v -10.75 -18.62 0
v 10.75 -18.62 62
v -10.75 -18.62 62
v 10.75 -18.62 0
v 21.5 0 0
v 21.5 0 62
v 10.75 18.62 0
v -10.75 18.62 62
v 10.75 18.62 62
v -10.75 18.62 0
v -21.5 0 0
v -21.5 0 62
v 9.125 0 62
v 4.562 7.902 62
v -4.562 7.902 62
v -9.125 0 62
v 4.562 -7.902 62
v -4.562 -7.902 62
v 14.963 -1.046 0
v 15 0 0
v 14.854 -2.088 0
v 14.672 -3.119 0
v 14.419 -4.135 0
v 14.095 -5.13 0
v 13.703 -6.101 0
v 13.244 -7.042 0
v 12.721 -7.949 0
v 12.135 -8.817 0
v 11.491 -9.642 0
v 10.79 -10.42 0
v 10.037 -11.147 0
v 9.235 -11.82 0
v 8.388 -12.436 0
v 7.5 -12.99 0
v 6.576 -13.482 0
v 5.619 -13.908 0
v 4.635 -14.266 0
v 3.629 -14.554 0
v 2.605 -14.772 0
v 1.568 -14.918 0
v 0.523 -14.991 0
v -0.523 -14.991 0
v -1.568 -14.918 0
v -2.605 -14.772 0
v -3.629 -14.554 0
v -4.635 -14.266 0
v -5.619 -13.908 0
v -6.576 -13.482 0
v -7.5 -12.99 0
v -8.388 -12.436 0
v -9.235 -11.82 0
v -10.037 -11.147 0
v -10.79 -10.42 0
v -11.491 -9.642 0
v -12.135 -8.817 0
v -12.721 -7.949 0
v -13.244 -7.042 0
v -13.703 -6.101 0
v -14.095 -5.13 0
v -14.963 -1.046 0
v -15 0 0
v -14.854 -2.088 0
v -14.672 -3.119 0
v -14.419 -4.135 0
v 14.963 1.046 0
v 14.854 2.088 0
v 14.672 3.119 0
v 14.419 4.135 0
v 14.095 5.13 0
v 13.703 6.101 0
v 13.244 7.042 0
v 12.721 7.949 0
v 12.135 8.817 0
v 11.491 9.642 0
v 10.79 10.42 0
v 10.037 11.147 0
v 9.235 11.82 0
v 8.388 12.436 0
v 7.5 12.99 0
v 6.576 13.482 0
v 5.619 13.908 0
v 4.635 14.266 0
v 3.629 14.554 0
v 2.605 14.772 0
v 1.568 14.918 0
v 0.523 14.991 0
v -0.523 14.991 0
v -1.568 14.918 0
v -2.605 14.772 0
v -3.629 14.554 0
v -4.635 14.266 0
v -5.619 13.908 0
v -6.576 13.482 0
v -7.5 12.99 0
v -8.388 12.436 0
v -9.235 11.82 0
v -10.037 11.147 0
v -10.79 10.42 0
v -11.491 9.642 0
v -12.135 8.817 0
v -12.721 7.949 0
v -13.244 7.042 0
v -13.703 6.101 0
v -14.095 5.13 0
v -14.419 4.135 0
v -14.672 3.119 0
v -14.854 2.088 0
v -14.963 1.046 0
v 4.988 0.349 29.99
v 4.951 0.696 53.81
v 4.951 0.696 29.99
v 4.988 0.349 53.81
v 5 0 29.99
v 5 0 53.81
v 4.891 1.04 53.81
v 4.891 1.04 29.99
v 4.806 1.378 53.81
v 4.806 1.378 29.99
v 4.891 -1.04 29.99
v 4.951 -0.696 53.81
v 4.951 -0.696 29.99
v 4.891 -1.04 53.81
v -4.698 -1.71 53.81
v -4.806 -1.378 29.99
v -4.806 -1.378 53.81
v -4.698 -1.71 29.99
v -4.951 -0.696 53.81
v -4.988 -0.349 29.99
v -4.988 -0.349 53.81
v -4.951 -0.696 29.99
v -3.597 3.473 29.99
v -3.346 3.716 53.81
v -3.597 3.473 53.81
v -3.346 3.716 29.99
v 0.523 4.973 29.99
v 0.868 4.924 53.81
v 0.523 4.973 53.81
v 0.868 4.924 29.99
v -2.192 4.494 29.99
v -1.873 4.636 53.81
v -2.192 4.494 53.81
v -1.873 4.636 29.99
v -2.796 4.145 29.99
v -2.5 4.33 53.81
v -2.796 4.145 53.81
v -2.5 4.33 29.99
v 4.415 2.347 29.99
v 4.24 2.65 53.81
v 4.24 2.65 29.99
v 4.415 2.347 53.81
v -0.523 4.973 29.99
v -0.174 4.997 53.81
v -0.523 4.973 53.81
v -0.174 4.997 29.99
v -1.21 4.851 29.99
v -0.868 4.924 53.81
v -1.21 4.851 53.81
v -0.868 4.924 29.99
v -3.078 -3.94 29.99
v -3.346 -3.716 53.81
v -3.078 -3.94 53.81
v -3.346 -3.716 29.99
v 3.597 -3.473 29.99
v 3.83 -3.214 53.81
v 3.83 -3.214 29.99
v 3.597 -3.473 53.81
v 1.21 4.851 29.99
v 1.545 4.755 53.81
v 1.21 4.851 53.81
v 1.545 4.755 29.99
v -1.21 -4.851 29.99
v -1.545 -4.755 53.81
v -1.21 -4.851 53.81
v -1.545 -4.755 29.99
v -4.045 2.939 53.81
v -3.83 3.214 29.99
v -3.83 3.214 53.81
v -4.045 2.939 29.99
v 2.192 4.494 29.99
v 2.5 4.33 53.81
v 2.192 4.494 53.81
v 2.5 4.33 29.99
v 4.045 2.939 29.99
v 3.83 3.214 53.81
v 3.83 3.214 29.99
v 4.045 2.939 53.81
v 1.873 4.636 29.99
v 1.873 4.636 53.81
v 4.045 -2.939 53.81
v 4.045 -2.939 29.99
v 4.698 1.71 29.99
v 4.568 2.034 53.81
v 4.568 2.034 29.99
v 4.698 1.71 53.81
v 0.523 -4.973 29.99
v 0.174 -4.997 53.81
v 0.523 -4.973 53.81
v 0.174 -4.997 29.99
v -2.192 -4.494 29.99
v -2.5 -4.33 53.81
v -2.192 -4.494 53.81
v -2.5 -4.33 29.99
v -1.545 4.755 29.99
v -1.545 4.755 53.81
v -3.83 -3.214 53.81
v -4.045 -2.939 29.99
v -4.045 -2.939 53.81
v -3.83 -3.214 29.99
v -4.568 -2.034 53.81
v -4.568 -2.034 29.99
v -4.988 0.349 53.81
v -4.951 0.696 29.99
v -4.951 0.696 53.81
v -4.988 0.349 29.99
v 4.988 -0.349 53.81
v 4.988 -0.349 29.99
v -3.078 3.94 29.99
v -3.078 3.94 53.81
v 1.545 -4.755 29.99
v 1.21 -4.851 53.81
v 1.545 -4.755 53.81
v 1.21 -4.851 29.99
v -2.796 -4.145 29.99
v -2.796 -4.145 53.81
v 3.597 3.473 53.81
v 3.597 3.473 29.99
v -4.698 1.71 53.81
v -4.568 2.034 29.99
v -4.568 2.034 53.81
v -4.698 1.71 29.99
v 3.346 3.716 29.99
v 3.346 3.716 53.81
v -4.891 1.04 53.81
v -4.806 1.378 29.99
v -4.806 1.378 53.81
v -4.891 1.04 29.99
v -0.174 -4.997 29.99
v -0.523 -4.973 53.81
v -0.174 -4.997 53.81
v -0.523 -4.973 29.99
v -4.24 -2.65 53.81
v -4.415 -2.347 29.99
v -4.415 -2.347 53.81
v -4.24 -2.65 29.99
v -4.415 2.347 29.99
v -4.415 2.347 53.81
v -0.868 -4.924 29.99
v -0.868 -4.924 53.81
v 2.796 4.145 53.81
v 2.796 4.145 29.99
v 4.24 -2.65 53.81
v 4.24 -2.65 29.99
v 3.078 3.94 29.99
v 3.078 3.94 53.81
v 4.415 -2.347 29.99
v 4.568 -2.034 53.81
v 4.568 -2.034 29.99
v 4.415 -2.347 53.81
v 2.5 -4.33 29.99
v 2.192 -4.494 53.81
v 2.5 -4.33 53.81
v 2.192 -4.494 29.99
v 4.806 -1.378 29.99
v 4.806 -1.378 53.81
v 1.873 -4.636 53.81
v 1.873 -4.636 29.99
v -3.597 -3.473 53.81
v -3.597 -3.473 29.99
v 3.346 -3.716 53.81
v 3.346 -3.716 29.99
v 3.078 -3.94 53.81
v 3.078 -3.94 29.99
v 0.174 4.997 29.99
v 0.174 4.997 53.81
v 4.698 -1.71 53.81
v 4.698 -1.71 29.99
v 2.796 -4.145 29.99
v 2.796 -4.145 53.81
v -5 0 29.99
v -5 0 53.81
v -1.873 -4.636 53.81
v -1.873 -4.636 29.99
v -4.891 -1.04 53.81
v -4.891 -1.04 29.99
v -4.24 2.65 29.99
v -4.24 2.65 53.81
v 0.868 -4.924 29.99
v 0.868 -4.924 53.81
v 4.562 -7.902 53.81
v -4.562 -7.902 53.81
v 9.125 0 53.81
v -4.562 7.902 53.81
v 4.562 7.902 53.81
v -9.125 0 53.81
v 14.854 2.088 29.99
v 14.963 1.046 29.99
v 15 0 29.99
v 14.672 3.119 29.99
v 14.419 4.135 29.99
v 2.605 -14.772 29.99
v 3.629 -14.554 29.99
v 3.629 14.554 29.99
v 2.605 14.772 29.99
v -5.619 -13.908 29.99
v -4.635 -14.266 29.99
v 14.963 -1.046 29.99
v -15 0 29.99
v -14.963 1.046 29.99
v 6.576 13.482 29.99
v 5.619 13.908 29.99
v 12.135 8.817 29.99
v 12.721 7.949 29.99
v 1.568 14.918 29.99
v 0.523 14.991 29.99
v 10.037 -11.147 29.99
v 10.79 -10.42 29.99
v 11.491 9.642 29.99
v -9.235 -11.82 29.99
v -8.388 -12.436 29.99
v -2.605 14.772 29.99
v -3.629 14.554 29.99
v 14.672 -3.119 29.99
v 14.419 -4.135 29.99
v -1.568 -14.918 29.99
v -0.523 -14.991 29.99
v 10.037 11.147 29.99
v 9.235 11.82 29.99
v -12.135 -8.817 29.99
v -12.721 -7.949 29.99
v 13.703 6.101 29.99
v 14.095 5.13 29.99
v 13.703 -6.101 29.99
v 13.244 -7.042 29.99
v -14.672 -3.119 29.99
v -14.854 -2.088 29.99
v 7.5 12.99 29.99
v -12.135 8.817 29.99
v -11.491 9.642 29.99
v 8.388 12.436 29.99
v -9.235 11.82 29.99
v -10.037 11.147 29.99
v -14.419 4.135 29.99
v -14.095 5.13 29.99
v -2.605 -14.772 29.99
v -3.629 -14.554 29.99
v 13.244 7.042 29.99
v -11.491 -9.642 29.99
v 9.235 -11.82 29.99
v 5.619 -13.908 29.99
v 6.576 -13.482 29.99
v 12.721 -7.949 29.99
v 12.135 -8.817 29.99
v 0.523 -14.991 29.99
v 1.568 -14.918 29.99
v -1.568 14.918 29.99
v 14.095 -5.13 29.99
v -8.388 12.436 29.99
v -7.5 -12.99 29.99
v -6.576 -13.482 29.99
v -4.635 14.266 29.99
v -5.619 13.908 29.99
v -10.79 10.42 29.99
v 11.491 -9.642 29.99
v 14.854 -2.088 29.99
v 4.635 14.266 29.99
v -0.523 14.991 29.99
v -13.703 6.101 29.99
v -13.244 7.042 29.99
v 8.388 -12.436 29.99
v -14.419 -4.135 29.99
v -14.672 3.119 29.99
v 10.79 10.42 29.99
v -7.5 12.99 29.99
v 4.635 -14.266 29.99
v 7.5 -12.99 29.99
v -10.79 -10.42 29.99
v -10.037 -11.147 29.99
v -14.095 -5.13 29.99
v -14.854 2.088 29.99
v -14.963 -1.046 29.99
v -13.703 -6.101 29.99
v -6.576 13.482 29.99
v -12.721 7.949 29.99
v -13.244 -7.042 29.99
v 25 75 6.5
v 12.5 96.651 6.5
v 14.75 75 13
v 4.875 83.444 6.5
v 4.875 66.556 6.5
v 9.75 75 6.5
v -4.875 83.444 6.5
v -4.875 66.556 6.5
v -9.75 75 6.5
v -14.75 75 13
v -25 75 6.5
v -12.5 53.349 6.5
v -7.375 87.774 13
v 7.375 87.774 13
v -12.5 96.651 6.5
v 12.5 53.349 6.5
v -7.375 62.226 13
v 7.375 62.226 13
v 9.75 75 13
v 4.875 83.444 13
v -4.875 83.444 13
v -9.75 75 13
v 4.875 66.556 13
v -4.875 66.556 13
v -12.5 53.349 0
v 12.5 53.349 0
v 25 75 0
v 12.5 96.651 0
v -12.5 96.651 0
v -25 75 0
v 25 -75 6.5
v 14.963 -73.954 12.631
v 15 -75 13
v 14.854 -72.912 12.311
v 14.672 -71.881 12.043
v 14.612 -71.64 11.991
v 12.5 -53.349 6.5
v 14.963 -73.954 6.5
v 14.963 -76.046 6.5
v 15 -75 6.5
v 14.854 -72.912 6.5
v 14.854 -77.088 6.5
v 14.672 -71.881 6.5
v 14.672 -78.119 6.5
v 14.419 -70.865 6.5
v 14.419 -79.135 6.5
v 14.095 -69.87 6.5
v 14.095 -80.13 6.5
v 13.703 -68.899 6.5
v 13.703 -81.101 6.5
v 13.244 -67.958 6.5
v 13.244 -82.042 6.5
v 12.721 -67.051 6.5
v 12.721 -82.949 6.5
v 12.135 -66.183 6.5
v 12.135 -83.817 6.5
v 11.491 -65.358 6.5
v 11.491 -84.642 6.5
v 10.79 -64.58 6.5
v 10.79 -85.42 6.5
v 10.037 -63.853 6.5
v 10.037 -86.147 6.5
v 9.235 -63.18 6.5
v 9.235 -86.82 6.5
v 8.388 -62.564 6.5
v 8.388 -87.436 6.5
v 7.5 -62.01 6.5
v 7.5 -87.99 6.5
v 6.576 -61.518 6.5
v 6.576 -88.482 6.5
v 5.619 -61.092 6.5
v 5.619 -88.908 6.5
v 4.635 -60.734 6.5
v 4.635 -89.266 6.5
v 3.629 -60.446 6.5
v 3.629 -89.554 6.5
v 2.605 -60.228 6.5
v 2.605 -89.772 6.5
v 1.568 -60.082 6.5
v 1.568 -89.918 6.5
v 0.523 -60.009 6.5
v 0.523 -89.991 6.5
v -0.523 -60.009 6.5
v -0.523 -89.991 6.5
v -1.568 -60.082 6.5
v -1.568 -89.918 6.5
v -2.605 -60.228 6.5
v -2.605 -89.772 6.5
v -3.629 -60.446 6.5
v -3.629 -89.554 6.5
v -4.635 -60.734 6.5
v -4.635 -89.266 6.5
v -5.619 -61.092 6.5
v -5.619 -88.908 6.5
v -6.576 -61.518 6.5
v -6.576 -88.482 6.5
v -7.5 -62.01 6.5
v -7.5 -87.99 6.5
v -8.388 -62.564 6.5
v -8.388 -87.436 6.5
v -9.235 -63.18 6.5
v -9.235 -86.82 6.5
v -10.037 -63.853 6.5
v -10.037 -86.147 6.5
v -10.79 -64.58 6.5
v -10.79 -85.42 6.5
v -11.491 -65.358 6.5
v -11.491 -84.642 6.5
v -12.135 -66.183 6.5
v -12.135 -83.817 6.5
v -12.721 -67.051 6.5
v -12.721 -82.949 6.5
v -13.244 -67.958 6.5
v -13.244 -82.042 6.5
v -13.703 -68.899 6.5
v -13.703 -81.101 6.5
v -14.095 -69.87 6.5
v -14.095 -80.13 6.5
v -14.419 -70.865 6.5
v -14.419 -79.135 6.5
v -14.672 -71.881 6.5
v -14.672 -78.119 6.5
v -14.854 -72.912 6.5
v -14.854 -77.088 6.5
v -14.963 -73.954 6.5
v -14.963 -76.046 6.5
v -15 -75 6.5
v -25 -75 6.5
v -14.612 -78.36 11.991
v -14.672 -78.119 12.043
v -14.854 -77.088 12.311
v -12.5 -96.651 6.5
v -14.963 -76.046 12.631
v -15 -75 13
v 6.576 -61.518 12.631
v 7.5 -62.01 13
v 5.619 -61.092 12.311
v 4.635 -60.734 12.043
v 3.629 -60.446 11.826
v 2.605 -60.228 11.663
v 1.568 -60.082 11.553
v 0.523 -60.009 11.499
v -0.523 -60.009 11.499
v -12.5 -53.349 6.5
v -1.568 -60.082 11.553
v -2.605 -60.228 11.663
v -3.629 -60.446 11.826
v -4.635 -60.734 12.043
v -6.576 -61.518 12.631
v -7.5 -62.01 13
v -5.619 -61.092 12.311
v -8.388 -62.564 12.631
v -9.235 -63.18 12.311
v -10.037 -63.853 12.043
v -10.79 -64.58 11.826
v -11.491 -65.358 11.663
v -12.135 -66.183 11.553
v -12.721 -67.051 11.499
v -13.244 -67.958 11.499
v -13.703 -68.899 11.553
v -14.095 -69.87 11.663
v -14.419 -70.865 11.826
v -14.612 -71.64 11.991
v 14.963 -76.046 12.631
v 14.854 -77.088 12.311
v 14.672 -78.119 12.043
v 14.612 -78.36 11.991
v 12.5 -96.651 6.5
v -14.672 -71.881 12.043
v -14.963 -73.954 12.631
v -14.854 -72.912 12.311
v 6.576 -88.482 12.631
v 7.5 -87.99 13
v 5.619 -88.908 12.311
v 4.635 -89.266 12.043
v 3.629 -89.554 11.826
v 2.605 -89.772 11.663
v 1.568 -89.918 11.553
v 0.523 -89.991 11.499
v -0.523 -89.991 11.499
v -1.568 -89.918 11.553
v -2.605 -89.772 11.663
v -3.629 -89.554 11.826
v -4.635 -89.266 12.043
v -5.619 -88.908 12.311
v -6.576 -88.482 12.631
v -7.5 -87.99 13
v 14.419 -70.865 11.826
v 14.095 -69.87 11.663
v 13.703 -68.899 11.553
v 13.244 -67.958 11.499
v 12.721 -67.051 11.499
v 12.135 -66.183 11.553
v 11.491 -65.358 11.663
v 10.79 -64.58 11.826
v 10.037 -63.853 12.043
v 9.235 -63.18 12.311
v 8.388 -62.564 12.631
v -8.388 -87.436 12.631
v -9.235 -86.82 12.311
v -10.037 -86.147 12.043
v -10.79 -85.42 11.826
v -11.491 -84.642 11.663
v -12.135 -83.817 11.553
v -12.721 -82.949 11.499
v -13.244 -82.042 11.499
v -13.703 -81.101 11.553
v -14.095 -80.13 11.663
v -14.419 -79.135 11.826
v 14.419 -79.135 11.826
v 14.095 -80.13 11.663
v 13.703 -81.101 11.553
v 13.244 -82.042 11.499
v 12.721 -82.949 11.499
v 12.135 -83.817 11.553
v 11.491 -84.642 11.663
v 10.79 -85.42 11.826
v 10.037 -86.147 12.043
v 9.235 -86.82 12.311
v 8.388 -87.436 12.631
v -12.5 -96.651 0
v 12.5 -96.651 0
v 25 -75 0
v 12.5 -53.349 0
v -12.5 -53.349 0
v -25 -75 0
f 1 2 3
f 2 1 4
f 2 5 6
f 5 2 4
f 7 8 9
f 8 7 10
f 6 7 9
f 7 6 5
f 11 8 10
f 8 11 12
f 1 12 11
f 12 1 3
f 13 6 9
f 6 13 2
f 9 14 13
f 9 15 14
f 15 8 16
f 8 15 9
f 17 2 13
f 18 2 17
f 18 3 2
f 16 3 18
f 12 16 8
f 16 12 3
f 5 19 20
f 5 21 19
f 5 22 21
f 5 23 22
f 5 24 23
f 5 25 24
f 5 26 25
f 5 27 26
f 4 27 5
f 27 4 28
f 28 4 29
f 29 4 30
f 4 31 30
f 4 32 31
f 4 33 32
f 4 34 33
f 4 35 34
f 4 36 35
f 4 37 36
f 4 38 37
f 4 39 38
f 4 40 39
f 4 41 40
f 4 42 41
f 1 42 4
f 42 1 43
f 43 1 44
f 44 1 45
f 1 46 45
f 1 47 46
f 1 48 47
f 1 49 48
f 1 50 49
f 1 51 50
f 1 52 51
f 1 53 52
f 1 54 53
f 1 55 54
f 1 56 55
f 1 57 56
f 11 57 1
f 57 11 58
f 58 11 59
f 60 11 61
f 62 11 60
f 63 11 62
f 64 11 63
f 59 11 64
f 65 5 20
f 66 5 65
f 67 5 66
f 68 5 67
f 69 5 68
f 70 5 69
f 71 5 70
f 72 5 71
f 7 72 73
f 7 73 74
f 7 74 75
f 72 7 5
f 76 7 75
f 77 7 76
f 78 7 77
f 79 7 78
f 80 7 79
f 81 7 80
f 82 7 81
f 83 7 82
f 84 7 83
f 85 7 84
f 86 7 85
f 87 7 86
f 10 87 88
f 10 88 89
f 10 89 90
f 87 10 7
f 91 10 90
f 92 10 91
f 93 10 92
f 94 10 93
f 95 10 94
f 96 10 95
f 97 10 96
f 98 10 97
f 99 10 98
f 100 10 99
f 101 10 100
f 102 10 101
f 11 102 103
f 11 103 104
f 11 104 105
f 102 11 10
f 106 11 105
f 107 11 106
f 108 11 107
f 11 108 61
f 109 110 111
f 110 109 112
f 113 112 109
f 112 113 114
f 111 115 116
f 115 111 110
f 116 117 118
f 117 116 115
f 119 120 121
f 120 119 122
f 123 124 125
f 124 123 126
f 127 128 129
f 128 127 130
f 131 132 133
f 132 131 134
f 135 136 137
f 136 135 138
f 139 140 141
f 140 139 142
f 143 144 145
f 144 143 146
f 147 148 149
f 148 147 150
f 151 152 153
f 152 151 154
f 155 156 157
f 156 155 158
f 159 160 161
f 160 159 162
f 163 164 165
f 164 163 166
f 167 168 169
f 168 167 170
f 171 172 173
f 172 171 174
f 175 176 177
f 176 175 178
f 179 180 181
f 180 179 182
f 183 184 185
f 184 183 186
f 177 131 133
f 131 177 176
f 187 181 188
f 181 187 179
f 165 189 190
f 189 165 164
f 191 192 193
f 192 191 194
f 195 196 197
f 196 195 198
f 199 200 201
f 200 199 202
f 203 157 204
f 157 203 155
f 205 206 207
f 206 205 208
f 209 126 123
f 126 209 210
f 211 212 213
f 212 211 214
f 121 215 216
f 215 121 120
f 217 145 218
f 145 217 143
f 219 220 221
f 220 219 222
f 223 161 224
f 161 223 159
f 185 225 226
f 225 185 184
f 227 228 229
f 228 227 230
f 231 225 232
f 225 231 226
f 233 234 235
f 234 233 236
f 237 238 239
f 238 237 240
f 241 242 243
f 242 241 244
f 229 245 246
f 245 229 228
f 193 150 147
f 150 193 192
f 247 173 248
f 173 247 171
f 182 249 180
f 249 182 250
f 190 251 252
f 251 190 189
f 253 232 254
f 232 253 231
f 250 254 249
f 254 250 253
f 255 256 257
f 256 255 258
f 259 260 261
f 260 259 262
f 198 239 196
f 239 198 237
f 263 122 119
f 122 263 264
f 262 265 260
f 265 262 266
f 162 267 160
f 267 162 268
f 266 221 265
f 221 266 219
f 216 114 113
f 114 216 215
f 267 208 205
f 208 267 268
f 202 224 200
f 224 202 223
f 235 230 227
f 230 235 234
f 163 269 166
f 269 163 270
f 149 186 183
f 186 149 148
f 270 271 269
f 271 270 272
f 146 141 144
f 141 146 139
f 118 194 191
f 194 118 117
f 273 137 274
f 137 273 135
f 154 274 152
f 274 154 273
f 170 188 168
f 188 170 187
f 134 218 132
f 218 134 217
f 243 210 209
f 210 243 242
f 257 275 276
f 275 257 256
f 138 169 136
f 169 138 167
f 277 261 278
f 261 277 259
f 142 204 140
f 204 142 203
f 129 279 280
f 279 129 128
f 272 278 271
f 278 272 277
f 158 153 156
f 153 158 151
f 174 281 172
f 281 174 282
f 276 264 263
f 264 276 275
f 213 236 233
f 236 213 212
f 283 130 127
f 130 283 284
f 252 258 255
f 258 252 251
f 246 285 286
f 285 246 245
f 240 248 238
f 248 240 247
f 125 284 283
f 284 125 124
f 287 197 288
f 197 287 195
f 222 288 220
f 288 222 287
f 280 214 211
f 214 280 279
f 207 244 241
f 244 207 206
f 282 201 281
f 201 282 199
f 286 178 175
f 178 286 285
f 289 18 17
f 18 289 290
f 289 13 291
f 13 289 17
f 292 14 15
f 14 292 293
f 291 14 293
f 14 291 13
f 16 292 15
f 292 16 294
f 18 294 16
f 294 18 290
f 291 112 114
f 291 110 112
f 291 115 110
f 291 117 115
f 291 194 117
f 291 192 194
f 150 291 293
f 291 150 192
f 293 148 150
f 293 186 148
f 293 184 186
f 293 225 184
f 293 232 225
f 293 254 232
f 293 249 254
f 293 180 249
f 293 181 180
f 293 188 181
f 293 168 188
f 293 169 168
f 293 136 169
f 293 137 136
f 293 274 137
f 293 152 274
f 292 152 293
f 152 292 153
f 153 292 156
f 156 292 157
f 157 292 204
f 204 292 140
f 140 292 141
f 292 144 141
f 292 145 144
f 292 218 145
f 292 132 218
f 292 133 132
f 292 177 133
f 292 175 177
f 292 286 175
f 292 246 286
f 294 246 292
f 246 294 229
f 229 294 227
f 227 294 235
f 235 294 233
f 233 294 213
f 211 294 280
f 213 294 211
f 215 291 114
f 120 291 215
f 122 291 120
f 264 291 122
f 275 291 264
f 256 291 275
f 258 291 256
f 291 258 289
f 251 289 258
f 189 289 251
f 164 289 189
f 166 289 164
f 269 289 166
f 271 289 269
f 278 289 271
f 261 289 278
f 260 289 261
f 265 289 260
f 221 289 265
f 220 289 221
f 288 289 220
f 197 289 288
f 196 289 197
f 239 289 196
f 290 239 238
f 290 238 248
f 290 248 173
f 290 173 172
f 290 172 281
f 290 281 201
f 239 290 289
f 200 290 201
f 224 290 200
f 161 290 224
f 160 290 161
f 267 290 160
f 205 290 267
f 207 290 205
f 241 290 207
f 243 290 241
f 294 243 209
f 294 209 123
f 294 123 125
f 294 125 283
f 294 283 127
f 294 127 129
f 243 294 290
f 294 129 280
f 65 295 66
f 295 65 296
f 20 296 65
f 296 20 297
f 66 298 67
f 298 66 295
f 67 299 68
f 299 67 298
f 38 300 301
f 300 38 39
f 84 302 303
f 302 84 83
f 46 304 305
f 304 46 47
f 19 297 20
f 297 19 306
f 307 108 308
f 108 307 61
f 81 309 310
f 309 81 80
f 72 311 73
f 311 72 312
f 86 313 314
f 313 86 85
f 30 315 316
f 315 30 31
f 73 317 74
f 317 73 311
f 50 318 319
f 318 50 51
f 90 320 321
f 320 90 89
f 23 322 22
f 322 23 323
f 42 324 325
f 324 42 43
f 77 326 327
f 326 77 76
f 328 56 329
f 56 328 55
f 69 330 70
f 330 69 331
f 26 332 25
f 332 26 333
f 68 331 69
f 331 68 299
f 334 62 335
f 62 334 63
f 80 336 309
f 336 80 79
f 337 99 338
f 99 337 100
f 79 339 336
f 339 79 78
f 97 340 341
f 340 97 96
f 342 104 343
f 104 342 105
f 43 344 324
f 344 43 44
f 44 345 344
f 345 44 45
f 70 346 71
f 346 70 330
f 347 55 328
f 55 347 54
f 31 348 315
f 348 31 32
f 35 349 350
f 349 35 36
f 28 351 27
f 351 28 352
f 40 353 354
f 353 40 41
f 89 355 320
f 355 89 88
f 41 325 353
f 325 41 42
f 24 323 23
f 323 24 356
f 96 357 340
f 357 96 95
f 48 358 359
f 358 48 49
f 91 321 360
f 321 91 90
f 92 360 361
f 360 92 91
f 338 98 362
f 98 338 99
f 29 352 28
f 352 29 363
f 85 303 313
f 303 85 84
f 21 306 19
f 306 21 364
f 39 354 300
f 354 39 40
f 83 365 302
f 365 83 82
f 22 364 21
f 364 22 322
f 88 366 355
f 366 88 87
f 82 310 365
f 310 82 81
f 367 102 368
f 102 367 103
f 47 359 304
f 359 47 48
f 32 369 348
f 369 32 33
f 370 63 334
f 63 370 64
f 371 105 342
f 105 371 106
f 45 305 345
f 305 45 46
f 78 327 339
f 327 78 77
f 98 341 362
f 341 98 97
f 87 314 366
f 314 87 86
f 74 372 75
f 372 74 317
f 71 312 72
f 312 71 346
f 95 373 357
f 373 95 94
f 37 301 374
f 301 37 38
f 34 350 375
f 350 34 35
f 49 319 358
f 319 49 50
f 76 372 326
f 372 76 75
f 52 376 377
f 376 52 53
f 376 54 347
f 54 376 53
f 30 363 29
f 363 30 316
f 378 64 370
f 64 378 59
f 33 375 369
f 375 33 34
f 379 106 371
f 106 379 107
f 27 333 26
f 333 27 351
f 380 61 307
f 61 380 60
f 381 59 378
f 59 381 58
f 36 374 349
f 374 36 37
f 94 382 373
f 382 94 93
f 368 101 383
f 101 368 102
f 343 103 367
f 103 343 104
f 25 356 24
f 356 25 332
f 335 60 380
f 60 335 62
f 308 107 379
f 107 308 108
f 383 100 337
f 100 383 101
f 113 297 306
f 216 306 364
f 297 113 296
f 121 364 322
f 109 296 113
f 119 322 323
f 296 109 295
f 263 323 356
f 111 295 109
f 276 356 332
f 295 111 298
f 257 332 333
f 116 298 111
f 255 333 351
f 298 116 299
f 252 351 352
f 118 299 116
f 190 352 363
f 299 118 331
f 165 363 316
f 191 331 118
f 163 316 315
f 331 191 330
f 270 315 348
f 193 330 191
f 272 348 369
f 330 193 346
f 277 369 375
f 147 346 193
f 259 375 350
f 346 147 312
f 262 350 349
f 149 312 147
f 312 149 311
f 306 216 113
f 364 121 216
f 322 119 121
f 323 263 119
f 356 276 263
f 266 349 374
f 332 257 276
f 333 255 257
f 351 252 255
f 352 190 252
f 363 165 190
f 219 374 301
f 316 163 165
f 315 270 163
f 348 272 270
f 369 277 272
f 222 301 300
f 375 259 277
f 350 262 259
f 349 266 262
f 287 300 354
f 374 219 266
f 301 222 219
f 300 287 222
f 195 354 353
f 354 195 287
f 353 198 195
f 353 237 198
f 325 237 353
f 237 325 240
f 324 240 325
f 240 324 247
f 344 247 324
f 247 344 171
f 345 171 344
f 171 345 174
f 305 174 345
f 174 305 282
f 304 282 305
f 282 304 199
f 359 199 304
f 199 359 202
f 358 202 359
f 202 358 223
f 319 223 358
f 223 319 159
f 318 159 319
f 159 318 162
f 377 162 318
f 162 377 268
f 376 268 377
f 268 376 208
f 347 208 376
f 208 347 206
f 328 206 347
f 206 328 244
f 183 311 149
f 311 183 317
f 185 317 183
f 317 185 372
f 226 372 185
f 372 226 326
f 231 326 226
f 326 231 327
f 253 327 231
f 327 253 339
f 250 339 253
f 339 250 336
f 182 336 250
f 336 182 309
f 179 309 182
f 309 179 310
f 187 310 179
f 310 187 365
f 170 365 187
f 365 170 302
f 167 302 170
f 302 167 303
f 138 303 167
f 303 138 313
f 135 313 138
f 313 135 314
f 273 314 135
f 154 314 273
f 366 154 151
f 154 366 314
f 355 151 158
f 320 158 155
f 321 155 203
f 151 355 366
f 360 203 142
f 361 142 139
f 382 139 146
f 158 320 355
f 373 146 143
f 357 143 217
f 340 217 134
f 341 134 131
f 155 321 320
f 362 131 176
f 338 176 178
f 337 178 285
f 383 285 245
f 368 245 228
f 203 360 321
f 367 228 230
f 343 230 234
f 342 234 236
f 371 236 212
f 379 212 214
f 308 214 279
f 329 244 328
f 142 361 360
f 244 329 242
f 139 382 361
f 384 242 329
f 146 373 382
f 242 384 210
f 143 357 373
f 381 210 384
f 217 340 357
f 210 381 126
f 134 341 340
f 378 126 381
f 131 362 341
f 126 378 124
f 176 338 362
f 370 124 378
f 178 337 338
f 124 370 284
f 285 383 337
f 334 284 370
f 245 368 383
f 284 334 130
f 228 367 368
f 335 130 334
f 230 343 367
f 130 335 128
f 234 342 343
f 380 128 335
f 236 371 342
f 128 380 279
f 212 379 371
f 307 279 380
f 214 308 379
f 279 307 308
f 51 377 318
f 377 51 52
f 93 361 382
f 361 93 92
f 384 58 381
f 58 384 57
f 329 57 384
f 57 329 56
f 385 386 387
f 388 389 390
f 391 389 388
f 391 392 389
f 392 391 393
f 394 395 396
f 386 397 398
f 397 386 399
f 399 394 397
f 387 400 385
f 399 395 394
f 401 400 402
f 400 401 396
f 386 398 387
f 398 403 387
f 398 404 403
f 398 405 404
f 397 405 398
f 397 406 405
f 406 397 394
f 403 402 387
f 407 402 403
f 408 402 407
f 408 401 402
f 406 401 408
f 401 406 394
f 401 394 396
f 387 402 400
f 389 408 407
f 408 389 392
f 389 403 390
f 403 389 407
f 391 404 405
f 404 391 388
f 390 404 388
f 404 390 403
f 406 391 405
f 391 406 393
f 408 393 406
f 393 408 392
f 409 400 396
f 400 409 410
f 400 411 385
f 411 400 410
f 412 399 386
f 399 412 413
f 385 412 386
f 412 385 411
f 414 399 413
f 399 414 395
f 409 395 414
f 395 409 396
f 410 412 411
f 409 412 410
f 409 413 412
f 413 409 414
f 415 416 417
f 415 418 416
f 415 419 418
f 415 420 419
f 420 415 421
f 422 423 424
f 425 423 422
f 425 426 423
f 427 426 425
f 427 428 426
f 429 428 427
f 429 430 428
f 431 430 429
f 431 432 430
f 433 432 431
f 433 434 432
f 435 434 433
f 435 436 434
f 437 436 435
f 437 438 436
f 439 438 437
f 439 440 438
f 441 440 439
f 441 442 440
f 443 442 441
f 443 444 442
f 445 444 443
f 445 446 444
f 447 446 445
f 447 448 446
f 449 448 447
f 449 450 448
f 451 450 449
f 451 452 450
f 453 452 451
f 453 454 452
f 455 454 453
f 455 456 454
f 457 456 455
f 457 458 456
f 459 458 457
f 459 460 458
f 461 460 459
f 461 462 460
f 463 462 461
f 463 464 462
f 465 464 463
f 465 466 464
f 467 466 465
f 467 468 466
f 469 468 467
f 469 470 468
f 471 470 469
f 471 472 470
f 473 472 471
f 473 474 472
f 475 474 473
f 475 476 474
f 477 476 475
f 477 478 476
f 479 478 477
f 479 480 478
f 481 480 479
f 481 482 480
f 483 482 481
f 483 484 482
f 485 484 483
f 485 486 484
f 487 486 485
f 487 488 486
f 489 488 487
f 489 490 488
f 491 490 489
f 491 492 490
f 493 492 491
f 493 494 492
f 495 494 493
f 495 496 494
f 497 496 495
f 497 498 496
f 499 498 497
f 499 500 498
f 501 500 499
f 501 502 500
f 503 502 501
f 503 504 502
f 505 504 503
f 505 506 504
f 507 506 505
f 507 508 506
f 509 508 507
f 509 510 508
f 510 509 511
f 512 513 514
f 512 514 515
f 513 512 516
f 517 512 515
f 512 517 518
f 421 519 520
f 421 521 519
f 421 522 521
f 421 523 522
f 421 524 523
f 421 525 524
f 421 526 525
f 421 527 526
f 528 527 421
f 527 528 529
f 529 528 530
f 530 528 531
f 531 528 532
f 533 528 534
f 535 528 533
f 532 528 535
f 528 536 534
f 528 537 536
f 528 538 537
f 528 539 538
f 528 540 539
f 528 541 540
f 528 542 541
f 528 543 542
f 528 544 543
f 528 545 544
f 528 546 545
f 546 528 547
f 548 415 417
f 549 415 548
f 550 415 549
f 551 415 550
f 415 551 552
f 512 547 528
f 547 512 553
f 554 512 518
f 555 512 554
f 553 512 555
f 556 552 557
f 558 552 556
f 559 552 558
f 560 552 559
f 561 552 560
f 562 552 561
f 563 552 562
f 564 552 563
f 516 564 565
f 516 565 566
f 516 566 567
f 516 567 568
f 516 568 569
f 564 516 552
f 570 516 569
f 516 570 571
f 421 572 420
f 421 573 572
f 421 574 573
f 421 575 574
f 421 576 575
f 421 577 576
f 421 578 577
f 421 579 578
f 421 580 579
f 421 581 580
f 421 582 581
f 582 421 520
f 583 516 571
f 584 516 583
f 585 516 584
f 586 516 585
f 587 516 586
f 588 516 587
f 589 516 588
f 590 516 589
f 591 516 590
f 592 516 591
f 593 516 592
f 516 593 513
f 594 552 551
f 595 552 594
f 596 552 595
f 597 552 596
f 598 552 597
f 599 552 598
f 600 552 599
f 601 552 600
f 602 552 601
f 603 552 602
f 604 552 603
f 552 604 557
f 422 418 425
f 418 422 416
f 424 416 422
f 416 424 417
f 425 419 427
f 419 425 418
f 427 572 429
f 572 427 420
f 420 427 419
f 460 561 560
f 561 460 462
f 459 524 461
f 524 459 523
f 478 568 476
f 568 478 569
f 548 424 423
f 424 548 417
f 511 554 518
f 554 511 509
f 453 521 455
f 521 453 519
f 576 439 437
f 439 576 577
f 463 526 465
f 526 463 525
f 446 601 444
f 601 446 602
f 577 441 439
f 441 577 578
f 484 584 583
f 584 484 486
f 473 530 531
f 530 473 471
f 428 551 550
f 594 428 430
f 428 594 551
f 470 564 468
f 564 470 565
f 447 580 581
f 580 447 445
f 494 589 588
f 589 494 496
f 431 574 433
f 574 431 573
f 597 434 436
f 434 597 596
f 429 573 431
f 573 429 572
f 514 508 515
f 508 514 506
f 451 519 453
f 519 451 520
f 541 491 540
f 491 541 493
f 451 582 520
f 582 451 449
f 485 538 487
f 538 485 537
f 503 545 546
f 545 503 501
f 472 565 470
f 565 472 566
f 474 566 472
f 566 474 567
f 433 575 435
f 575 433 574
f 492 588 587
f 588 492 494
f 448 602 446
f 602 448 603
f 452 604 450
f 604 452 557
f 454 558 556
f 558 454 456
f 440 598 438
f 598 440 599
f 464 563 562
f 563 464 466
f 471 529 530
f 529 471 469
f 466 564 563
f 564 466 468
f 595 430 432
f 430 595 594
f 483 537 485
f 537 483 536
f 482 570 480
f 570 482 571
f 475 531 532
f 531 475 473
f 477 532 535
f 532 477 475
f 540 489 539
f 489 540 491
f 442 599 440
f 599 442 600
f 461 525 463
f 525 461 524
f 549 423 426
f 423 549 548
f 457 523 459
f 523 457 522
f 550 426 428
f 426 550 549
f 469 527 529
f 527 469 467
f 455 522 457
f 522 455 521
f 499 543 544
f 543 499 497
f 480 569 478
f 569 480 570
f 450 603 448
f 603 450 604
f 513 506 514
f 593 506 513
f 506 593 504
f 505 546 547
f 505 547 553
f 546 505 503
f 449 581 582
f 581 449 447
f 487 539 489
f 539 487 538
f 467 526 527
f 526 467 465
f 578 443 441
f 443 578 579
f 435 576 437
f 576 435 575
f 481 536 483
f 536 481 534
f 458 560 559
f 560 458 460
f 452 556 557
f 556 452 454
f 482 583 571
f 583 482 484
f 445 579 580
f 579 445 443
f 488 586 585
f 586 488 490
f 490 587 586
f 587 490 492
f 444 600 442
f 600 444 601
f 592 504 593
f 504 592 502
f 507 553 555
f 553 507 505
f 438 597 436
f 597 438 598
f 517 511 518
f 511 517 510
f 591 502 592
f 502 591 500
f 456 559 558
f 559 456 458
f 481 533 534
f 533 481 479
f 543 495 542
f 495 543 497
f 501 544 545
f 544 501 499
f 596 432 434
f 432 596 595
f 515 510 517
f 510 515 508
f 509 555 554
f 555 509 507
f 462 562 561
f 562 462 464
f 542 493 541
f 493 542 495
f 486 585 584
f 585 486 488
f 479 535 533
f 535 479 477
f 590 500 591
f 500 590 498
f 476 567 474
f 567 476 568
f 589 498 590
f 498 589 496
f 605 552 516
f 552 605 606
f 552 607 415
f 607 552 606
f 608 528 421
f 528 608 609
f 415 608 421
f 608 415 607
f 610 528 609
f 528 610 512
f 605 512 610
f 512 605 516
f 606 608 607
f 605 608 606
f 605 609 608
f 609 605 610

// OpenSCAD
eps = 0.01;
$fn = 90;

// thread diameter
m_d = 10;

// screw diameter
s_d = 3.5;
// screw head diameter
s_h = 7;
// screw head conic part height
s_c = 2.5;

// nut diameter
n_d = 18.25;
// nut thickness
n_t = 8.2;

// bolt head diamater
b_d = 19.5;
// bolt head thickness
b_t = 6.5;

// base leg dimensions
a = 50;
// base thicknes
t = 5;
// total leg heigh
h = 75-2*b_t;

// handle diameter
h_d = 30;

// handle hole heigh
hhh = 30;

module base()
{
    difference()
    {
        // cylinder 
        cylinder(d=a-s_h,h=h,$fn=6);
        // bolt hole
        translate([0,0,-eps])
            cylinder(d=m_d,h=h+2*eps);
        // nut hole
        translate([0,0,h-n_t+eps])
            cylinder(d=n_d, h=n_t+2*eps, $fn=6);
        // handle hole
        translate([0,0,-eps])
            cylinder(d=h_d, h=hhh);
        
    }
}

base();

module foot()
{
    translate([0,0,b_t])
    difference()
    {
        cylinder(d1=a,d2=b_d+2*t,h=b_t, $fn=6);
        translate([0,0,-eps])cylinder(d=b_d,h=b_t+2*eps,$fn=6);
    }
    cylinder(d=a,h=b_t,$fn=6);
}

translate([0,1.5*a,0]) foot();

module foot_ender()
{
    translate([0,0,b_t])
    difference()
    {
        cylinder(d1=a,d2=h_d,h=b_t, $fn=6);
        translate([0,0,-eps])cylinder(d=h_d,h=b_t+2*eps);
    }
    cylinder(d=a,h=b_t,$fn=6);
}

translate([0,-1.5*a,0]) foot_ender();
